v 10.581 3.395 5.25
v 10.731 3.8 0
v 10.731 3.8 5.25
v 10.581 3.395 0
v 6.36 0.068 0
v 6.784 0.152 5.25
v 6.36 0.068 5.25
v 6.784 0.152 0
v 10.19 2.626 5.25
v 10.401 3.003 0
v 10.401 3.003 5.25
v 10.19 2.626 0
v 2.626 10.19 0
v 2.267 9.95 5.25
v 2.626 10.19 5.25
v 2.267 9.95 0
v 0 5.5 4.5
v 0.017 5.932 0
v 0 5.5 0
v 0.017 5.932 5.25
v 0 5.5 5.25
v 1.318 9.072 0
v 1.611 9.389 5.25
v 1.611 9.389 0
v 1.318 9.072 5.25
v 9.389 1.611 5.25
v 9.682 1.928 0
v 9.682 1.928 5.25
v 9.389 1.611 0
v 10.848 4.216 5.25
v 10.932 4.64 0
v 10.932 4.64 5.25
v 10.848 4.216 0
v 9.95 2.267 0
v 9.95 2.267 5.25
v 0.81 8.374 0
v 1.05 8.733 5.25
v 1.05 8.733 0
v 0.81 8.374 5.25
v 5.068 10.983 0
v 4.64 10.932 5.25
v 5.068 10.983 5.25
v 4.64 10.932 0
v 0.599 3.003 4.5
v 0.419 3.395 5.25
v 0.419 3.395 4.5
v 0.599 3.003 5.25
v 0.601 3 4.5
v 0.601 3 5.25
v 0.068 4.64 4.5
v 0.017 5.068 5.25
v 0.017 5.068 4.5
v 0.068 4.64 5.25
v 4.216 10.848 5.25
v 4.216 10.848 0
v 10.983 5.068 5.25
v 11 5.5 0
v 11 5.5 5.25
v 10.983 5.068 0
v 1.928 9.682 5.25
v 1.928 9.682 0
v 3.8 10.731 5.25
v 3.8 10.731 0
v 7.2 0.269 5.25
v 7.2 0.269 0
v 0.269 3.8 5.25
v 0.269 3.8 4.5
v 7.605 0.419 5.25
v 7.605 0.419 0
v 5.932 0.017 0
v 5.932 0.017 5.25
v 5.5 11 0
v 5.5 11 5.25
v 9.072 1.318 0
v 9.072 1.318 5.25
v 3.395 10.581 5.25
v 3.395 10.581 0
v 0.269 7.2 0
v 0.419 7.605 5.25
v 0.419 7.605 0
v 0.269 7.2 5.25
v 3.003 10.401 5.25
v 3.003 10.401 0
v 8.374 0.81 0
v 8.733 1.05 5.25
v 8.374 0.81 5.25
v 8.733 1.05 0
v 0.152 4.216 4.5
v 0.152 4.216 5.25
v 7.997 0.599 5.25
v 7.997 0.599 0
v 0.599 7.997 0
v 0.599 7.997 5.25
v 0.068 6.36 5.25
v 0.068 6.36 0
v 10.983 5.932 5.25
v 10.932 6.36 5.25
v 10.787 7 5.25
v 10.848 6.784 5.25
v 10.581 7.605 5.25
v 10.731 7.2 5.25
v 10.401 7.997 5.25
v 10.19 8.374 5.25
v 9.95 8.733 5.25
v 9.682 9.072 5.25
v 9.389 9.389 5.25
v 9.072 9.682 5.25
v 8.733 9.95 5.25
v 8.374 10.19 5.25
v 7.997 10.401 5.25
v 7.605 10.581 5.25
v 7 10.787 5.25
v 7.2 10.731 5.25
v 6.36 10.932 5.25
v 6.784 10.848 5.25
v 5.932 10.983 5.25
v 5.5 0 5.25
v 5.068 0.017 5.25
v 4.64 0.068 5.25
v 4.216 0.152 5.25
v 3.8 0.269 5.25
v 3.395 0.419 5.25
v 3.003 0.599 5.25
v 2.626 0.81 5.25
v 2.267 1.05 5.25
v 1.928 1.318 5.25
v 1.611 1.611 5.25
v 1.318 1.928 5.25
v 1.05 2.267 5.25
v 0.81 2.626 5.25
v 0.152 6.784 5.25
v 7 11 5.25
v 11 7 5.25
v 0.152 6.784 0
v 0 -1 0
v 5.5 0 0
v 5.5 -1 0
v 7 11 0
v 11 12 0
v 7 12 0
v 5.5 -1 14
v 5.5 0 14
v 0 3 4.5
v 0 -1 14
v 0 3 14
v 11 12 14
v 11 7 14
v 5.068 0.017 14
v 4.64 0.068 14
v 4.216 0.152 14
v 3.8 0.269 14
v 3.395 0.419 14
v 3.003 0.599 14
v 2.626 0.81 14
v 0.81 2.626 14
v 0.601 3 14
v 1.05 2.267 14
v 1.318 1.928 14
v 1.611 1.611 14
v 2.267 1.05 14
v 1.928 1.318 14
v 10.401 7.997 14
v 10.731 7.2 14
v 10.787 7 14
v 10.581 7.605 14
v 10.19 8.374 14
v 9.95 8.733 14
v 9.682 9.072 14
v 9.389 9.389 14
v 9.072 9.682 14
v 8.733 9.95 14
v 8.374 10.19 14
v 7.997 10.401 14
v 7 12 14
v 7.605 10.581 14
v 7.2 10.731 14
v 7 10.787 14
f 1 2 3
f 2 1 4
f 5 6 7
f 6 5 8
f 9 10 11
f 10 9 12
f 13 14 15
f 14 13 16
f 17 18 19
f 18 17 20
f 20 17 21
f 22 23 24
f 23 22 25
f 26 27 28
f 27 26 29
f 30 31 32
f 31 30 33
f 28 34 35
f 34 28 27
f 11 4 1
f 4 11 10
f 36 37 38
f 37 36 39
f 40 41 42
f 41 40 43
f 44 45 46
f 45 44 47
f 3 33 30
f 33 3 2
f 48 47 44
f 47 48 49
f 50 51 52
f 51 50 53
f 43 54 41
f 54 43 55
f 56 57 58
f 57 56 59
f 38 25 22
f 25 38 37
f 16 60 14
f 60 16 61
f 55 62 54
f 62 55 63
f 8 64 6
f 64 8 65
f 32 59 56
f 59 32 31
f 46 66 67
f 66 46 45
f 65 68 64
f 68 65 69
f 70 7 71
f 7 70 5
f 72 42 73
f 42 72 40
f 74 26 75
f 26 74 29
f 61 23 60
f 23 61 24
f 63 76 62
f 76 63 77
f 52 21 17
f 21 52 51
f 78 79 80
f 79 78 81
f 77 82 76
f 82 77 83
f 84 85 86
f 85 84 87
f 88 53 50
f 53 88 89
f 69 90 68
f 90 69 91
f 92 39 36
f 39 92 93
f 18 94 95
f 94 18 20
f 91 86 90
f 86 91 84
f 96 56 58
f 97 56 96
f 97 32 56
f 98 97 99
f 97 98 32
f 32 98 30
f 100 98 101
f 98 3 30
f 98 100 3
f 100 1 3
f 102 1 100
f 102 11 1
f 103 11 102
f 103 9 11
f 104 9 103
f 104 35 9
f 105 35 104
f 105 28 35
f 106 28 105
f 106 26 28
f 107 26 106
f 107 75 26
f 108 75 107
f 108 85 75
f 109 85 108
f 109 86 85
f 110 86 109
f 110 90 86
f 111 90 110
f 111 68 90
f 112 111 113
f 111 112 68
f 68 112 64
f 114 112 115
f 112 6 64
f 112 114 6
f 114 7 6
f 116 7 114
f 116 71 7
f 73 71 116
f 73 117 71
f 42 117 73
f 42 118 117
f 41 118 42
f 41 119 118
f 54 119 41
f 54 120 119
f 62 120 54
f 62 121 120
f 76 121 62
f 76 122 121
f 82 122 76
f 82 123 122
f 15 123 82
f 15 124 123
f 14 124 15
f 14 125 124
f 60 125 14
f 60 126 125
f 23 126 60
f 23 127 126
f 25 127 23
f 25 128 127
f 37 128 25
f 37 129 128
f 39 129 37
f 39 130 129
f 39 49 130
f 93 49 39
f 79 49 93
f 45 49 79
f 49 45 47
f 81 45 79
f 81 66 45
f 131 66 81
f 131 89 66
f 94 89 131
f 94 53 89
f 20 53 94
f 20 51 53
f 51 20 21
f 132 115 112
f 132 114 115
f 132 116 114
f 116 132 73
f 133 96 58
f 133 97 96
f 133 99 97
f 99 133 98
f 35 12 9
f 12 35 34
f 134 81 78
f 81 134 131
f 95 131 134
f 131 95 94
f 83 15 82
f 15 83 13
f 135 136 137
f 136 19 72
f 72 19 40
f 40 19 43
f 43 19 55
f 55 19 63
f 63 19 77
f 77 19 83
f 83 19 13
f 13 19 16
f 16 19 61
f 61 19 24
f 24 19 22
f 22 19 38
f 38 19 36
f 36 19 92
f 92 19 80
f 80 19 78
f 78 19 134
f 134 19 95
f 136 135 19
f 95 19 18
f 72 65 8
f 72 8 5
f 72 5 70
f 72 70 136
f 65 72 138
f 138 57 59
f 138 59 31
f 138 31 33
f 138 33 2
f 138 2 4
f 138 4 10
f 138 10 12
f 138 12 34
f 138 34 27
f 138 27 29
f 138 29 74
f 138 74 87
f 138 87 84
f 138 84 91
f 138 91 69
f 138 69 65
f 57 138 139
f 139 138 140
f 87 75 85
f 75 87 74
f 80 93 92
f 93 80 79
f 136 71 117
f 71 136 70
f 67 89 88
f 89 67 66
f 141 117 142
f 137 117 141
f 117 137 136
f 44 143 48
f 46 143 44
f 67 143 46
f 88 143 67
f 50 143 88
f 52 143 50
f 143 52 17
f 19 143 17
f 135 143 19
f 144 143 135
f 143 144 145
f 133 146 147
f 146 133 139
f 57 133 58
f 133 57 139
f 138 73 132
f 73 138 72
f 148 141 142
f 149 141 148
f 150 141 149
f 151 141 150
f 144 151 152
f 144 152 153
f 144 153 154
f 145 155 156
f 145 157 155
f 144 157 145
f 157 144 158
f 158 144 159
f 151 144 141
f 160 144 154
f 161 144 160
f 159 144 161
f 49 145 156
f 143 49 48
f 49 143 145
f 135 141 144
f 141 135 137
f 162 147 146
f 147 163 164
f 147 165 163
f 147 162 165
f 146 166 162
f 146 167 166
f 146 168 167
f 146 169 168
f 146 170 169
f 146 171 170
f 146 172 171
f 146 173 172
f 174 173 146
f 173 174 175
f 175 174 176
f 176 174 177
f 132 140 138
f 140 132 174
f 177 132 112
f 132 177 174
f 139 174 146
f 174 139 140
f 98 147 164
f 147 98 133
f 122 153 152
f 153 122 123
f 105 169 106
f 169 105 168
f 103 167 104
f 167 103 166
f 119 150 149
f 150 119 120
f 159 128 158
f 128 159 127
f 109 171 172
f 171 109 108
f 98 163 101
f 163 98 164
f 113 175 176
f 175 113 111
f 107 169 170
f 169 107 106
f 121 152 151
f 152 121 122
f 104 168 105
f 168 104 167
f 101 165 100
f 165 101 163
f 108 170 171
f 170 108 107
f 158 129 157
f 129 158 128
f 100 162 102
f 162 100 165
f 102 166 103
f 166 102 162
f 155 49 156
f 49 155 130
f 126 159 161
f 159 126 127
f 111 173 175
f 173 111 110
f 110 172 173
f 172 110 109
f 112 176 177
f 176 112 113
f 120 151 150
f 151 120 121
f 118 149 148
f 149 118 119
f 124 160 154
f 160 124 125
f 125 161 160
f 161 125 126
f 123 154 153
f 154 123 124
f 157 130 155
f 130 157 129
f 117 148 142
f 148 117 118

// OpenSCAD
//--------------------------------------------------------------------//
// Mount Stabilizers for TrackIR TrackClip PRO                        //
//--------------------------------------------------------------------//
// Author        : Patrick Henry                                      //
// Contact       : https://github.com/microcontroller                 //
// License       : MIT - http://opensource.org/licenses/MIT           //
//--------------------------------------------------------------------//
// TrackIR is a head-tracking solution using IR LEDs and a sensor.    //
// The TrackClip PRO attaches to headphones, and includes two swivel  //
// joints, which are likely to break if not treated carefully. Rather //
// than replacing the clip, we can repair it by adding these mount    //
// stabilizers.                                                       //
//--------------------------------------------------------------------//

$fn = 80;

//--------------------------------------------------------------------//
// The upper mount is where the LED assembly attaches to the clip.    //
// The assembly slides into a circular slot in the clip, and is       //
// supposed to snap into place. If it snaps apart, there is nothing   //
// holding it in place. This stabilizer fits in behind the assembly,  //
// to wedge it in place while still allowing it to rotate. Note that  //
// the arms here are deliberately asymmetrical, to give a wide range  //
// of motion. Once you have the correct orientation, superglue the    //
// back of the stabilizer (as printed, the bottom) to the clip.       //
//--------------------------------------------------------------------//
module trackir_mount_upper() {
  difference() {
    union() {
      translate([5.5, 5.5, 0])
        cylinder(r = 5.5, h = 5.25);
      cube([5.5, 5.5, 4.5]);
      translate([5.5, 5.5, 0])
        cube([5.5, 5.5, 5.25]);
      translate([0,-1,0])
        cube([5.5, 4, 14]);
      translate([11-4, 11-4, 0])
      cube([4, 5, 14]);
    }
    translate([5.5, 5.5, 5.25])
      cylinder(r = 5.5, h = 10);
  }
}

//--------------------------------------------------------------------//
// At the lower mount is there is an arm coming from the upper mount  //
// and a branching structure containing 3 IR LEDs. These rotate using //
// the same kind of snap-in clip as the upper mount. There is nothing //
// at the back to force these two pieces together, so instead we have //
// a stabilizer that loosely holds them together, which must be made  //
// tight with the use of a zip-tie. There is a channel near the top   //
// of the stabilizer to allow the zip-tie to stay in place.           //
//--------------------------------------------------------------------//
module trackir_mount_lower() {
  difference() {
    union() {
      cylinder(r=7.5, h=5);
      //translate([-7, -7, 0])
      //  cube([14, 14, 5]);
      translate([-5, -7, 0])
        cube([10, 3, 25.5]);
      translate([-5, -7, 23])
        cube([10, 9, 2.5]);
    }
  translate([-5.1, -7.01, 21])
    cube([10.2, 0.5, 2]);
  translate([0, 0, 3])
    cylinder(r = 5.5, h = 11);
  translate([0, 0, 13.99])
    cylinder(r1 = 5.5, r2 = 3.25, h = 11.52);
  }
}

trackir_mount_upper();
//trackir_mount_lower();
